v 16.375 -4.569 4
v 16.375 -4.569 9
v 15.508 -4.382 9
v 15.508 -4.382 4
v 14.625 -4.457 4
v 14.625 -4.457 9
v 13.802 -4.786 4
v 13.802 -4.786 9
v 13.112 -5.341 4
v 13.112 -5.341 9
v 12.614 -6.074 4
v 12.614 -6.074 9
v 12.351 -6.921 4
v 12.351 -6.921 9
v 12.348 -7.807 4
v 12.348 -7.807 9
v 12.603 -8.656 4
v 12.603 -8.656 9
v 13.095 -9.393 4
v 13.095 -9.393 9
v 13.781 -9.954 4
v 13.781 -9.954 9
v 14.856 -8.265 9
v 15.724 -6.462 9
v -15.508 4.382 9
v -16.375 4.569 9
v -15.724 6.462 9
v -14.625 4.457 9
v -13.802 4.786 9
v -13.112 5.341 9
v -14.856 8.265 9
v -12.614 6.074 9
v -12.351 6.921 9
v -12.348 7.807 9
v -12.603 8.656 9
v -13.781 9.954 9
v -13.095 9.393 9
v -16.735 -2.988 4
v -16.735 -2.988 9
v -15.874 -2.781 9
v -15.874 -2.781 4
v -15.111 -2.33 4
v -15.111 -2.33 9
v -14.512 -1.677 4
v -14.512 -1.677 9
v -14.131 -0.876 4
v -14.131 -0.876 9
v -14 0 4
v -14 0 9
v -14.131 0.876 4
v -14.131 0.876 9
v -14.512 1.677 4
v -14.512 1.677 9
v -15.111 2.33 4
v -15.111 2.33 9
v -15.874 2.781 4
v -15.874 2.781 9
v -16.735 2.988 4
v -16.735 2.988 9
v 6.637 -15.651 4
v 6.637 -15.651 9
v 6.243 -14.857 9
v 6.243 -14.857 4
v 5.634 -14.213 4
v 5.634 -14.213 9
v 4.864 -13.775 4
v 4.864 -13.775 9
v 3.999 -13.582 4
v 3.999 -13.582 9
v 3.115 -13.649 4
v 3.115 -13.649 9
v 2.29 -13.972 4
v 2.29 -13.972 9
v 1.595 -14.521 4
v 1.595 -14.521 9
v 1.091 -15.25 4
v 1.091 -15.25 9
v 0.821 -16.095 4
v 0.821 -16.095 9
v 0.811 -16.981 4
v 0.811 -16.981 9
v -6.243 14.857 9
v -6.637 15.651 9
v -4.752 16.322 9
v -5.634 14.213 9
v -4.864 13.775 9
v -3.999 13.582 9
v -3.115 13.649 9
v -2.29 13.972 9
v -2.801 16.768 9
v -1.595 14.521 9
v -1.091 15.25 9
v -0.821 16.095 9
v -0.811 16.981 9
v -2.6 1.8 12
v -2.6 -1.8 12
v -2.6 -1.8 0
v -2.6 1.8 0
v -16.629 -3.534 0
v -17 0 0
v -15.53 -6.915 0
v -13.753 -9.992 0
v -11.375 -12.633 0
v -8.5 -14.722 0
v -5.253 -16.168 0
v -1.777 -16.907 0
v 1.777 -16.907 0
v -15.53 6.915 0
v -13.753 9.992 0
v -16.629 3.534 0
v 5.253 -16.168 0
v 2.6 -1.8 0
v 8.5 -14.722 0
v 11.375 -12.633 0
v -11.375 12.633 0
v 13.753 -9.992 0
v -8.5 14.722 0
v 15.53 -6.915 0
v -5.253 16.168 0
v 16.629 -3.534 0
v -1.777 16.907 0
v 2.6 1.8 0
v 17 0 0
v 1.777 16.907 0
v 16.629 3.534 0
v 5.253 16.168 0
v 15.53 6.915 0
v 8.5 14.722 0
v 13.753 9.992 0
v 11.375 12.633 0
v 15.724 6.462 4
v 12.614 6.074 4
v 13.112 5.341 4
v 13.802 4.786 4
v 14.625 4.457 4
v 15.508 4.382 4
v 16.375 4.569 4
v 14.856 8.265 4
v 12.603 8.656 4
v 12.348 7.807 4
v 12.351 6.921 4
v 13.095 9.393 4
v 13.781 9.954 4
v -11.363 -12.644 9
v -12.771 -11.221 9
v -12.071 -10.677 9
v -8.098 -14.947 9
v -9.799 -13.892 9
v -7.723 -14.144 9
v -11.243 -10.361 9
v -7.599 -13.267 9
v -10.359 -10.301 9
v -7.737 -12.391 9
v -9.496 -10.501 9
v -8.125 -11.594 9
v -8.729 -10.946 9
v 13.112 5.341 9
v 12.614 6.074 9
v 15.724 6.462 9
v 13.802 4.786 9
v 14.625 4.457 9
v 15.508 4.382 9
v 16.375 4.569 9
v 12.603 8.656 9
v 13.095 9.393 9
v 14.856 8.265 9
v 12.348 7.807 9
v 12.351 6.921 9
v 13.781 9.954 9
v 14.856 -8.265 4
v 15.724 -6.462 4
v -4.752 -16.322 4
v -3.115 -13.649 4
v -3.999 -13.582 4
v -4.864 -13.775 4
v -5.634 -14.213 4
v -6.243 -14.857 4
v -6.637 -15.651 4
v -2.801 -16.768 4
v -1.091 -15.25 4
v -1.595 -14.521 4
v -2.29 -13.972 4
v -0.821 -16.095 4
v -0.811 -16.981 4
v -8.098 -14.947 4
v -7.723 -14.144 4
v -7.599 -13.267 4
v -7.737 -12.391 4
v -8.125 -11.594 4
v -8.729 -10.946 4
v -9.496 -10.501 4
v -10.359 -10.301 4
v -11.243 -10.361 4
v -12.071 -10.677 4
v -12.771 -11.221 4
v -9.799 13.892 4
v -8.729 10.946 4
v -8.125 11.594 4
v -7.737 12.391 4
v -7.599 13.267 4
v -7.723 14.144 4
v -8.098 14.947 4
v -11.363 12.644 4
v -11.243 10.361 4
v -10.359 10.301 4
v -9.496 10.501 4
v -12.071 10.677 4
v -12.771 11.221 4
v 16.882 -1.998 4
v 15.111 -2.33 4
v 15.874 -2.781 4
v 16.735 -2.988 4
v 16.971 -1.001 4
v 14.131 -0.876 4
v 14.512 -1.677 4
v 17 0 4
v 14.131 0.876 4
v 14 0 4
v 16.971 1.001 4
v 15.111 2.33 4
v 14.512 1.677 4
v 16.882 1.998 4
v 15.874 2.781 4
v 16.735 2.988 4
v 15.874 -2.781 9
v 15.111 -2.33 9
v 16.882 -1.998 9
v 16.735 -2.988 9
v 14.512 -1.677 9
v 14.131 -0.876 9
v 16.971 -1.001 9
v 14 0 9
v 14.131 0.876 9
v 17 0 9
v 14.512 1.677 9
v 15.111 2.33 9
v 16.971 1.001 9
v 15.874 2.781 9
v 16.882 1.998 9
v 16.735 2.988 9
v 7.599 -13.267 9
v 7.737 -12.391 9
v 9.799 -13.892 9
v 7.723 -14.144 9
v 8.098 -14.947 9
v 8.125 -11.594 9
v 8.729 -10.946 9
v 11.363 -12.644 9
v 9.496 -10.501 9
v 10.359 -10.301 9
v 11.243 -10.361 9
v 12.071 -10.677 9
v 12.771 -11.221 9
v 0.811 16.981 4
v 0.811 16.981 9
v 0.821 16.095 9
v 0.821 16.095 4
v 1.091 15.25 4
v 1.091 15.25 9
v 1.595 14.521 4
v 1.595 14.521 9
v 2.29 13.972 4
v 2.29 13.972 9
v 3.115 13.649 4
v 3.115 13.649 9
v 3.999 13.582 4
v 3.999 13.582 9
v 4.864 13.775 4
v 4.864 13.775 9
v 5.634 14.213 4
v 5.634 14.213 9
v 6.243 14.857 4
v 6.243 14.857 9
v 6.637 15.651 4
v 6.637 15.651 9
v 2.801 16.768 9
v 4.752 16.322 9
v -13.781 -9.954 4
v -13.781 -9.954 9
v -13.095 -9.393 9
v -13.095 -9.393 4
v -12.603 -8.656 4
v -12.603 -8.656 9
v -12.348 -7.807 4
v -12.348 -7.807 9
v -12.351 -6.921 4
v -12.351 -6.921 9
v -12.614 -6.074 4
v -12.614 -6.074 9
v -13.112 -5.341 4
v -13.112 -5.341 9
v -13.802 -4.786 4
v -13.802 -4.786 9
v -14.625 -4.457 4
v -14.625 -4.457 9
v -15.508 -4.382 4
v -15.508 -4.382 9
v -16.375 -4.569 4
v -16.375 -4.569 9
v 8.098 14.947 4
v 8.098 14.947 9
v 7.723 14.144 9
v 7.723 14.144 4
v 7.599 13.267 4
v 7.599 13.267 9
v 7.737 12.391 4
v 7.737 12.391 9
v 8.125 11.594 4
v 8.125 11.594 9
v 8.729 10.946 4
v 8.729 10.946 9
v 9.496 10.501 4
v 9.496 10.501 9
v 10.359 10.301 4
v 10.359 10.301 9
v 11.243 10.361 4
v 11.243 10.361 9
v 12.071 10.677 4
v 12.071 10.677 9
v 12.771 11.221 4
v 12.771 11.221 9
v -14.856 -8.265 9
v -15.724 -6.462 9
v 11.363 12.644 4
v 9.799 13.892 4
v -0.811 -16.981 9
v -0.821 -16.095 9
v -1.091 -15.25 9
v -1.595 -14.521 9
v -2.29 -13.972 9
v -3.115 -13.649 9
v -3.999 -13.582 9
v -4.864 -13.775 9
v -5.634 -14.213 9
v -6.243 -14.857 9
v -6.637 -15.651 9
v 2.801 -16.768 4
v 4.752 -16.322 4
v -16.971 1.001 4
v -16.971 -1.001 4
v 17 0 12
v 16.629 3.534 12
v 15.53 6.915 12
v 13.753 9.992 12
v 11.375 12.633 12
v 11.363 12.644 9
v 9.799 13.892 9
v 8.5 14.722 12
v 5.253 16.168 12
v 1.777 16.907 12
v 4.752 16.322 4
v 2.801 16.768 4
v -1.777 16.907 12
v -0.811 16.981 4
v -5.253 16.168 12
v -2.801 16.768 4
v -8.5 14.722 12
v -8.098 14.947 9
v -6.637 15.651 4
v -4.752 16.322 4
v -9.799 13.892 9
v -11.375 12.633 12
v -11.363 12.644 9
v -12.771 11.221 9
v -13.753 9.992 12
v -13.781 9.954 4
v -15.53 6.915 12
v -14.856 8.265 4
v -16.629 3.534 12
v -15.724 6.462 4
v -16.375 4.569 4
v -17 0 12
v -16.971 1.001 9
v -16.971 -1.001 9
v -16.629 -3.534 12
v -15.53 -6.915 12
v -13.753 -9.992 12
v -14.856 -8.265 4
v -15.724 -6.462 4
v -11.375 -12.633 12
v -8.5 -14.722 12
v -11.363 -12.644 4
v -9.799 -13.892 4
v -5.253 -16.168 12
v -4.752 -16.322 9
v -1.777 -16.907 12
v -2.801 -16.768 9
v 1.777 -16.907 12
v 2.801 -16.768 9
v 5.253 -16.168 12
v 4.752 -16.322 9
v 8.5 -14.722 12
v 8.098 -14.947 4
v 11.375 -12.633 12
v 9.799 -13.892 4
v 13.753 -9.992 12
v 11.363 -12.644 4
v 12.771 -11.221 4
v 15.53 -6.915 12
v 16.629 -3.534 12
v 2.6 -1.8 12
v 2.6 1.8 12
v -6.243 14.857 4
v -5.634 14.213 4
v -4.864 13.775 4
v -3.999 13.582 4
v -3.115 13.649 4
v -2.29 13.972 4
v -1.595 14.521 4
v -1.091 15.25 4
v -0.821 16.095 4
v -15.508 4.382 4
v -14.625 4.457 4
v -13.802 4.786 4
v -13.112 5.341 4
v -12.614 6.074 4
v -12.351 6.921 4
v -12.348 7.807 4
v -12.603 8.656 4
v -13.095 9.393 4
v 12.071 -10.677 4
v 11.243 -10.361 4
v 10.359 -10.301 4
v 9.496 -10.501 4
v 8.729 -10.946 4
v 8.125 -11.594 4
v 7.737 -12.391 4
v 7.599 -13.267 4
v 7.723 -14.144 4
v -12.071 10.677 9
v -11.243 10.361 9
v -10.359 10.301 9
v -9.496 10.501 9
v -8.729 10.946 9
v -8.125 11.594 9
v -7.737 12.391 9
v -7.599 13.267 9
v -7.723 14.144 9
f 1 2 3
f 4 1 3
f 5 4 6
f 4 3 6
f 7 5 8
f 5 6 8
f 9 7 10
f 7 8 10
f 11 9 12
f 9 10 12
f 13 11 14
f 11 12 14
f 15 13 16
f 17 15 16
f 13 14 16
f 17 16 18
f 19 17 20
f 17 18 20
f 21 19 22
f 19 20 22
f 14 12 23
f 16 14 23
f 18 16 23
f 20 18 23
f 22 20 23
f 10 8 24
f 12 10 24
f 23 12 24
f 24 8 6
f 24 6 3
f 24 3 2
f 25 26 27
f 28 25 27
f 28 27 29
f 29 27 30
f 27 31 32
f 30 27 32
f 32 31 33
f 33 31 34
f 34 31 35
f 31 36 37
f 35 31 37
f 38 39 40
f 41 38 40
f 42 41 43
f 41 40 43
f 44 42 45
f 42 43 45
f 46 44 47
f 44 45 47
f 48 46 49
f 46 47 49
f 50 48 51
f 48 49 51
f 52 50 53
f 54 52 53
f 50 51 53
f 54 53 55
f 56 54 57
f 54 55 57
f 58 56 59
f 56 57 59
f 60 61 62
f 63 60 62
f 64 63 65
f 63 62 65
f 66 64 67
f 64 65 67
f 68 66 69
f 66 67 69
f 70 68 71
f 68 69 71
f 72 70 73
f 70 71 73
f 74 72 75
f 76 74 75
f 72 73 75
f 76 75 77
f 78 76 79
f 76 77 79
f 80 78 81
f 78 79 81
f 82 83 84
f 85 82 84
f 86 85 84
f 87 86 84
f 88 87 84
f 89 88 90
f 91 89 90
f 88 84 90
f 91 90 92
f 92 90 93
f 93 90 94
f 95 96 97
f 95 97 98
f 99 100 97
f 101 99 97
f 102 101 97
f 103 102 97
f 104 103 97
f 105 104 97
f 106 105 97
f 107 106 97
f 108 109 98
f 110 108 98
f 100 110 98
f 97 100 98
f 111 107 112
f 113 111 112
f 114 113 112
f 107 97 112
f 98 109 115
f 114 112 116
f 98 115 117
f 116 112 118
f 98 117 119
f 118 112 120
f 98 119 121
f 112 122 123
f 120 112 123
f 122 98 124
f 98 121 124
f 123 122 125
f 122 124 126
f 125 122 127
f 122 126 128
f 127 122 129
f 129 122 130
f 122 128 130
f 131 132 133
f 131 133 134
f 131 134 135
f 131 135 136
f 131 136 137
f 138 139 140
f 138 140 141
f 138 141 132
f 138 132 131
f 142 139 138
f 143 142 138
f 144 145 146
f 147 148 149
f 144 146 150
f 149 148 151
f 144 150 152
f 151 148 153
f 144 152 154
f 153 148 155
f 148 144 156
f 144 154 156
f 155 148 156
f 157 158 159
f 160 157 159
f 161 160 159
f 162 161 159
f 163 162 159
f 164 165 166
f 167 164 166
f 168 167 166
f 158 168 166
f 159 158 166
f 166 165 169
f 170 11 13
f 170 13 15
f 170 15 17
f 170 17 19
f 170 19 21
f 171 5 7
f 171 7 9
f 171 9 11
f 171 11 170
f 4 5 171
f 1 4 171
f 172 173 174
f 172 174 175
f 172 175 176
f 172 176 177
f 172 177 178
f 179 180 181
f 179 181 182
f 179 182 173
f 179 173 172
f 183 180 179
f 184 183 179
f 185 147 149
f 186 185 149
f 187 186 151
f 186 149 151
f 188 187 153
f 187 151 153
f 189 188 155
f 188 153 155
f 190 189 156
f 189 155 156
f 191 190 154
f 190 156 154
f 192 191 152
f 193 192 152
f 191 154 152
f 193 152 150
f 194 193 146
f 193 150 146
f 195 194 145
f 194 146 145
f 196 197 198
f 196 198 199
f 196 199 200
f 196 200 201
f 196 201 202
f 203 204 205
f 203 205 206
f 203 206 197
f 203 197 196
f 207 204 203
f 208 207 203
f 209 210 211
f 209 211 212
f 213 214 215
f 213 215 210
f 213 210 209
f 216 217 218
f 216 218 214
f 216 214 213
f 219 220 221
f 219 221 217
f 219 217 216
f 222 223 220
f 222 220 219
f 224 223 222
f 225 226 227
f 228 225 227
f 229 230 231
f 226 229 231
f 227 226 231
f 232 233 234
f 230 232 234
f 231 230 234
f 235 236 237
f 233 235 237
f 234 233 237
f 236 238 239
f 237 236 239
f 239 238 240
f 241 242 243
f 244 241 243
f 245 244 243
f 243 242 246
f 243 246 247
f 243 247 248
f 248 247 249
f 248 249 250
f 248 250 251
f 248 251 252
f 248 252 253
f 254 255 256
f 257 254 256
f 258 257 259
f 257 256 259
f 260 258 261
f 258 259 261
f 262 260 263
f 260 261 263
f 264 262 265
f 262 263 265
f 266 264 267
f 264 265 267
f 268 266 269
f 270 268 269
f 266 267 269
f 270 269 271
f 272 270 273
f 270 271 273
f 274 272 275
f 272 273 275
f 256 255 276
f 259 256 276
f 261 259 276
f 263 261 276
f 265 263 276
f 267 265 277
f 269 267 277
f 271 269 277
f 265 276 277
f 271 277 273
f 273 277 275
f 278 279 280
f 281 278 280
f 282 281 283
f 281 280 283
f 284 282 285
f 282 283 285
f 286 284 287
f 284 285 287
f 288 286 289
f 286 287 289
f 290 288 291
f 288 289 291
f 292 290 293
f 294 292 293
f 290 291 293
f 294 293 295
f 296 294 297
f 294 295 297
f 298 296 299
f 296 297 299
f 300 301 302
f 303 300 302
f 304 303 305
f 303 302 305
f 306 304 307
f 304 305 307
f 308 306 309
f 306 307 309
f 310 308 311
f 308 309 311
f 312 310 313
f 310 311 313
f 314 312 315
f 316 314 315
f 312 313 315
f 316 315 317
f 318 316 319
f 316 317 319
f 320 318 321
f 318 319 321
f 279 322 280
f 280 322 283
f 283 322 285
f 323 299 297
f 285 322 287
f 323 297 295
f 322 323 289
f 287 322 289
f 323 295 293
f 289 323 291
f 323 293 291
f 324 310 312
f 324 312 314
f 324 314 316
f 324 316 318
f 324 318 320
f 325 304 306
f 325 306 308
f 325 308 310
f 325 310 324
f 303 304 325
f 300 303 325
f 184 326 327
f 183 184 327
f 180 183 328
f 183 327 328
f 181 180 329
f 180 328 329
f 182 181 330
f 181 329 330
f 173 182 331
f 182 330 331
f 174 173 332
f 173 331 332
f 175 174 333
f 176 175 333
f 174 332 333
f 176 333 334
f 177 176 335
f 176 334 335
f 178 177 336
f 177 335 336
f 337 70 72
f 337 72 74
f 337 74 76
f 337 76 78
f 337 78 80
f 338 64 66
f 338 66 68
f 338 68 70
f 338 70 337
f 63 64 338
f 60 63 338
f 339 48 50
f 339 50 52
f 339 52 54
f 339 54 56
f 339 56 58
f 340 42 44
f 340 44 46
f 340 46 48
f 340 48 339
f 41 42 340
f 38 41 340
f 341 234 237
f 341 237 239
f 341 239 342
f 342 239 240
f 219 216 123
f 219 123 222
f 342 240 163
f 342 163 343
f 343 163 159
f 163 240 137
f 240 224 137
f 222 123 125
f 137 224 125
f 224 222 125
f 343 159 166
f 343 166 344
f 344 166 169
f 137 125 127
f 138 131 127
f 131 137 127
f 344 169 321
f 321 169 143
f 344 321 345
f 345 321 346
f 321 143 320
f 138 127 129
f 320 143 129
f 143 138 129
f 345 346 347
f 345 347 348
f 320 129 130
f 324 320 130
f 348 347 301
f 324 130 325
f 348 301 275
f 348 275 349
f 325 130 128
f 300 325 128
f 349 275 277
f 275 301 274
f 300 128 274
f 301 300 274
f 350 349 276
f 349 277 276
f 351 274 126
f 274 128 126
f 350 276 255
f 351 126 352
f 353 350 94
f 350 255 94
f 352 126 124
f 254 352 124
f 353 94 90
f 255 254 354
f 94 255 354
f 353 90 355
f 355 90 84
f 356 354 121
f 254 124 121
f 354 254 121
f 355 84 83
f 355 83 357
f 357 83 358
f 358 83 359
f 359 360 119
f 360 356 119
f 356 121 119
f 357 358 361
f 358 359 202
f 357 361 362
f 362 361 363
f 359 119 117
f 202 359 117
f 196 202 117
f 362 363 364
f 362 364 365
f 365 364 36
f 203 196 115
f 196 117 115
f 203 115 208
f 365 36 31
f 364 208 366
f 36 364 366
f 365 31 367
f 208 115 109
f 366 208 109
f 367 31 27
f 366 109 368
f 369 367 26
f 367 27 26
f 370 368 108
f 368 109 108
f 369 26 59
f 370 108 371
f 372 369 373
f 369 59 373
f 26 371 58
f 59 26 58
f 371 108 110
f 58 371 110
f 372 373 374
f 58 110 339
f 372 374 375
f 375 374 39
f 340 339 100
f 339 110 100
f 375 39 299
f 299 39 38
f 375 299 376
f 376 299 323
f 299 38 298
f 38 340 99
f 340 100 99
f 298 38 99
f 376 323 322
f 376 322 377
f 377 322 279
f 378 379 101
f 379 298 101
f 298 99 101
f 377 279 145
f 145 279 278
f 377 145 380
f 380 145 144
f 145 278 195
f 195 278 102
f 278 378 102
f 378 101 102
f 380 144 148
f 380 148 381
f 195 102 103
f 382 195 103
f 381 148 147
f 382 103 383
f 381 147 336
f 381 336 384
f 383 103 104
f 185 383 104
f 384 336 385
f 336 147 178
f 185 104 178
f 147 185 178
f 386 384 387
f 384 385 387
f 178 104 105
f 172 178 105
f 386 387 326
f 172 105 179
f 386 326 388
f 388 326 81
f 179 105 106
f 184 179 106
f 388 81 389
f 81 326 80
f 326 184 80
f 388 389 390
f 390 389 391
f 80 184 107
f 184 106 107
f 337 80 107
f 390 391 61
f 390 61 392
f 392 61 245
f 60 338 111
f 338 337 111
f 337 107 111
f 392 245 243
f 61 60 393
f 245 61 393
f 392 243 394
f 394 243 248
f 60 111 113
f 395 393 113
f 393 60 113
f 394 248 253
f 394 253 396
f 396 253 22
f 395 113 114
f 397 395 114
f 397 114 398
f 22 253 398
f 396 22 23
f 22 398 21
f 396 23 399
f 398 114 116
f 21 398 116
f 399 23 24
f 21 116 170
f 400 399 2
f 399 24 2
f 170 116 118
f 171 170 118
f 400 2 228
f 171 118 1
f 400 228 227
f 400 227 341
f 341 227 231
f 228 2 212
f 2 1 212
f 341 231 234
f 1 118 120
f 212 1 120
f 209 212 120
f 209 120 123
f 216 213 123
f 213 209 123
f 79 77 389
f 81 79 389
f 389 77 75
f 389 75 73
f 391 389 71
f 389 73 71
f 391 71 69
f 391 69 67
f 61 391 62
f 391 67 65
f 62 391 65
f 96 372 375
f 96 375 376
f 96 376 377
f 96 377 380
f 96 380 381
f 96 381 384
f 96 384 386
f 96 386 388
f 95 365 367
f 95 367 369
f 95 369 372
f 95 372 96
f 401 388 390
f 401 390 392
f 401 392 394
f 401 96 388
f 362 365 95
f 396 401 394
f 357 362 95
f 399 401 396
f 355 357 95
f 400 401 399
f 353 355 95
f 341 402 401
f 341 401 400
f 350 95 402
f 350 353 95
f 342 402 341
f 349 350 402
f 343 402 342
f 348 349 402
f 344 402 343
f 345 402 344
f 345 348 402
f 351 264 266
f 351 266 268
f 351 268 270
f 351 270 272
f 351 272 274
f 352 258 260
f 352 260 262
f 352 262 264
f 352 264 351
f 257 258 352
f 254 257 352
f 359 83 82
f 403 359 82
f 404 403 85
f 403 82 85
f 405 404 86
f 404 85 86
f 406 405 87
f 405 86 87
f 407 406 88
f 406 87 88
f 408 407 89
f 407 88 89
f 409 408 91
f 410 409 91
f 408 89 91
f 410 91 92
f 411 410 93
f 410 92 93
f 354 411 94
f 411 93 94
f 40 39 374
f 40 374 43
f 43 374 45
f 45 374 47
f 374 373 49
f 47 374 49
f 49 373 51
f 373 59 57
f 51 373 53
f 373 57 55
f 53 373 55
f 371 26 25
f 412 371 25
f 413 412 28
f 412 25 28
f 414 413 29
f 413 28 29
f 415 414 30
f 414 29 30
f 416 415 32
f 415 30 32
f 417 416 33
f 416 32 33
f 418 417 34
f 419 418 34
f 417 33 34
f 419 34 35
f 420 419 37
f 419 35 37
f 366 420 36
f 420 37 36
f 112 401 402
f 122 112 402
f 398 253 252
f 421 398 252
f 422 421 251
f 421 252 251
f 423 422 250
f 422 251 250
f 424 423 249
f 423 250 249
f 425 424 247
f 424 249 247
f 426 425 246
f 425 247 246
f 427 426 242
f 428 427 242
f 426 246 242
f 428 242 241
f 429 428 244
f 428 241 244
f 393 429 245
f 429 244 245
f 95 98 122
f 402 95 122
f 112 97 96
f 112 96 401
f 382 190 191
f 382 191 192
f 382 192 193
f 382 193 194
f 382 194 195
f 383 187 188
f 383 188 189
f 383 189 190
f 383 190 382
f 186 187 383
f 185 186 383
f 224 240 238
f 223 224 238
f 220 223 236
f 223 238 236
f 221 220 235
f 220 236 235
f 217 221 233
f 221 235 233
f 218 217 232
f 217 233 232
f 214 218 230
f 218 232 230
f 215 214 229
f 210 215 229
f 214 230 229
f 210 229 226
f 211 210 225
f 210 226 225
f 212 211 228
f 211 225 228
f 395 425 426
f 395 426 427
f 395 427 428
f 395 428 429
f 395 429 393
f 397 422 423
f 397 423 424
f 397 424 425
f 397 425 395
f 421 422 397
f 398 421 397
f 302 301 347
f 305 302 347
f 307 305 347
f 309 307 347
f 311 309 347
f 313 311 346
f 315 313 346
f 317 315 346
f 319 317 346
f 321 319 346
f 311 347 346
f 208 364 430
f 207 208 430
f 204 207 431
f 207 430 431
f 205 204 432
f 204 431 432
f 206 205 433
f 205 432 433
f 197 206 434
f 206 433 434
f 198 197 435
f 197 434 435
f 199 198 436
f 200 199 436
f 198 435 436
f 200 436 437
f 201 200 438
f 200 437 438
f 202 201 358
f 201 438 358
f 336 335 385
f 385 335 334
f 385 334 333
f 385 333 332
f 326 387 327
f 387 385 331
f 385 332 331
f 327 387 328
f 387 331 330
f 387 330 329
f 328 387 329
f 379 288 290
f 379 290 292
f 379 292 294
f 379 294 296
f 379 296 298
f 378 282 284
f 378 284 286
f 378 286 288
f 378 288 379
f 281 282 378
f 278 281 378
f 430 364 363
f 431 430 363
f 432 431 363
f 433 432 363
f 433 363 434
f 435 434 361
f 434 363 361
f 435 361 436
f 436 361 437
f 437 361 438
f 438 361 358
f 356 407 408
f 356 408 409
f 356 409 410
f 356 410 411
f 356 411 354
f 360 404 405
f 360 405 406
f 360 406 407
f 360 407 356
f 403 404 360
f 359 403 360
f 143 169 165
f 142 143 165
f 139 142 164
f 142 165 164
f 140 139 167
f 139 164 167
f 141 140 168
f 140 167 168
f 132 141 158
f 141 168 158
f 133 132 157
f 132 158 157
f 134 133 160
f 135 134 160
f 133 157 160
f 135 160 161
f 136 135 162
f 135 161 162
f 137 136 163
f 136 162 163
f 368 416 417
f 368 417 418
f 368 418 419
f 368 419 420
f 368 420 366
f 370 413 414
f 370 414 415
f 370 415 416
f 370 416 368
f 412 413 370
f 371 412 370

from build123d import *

# Parameters (mm, degrees)
F0_R      = 17
F1_DEPTH  = 4
F2_R      = 17
F3_DEPTH  = 5
F5_DEPTH  = 5
F6_COUNT  = 14
F7_R      = 17
F8_DEPTH  = 3
F9_W      = 5.2
F9_H      = 3.6
F10_DEPTH = 300


with BuildPart() as f1:
    # F0 (on Top) → F1 (new body)
    with BuildSketch(Plane.XY):
        Circle(F0_R)
    extrude(amount=F1_DEPTH)

    # F2 (on face) → F3 (join)
    with BuildSketch(Plane.XY.offset(4)):
        Circle(F2_R)
    extrude(amount=F3_DEPTH)

    # F6: F5 ×14 about axis
    f6_axis = Axis((0, 0, 9), (0, 0, 1))


with BuildPart() as f5:
    # F4 (on face) → F5 (new body)
    with BuildSketch(Plane.XY.offset(9)):
        with BuildLine():
            Line((19.066369161, -2.1748835579), (19.066369161, 2.1748835579))
            ThreePointArc((19.066369161, 2.1748835579), (18.1125082755, 2.7860949978), (17, 3))
            ThreePointArc((17, 3), (16.8675178144, 2.9970733175), (16.7352941176, 2.9882989803))
            ThreePointArc((16.7352941176, 2.9882989803), (16.9336942219, 1.5), (17, 0))
            ThreePointArc((17, 0), (16.9336942219, -1.5), (16.7352941176, -2.9882989803))
            ThreePointArc((16.7352941176, -2.9882989803), (16.8675178144, -2.9970733175), (17, -3))
            ThreePointArc((17, -3), (18.1125082755, -2.7860949978), (19.066369161, -2.1748835579))
        make_face()
        with BuildLine():
            ThreePointArc((17, 3), (18.1125082755, 2.7860949978), (19.066369161, 2.1748835579))
            Line((19.066369161, 2.1748835579), (19.066369161, 3))
            Line((19.066369161, 3), (17, 3))
        make_face()
        with BuildLine():
            ThreePointArc((17, 0), (16.9336942219, 1.5), (16.7352941176, 2.9882989803))
            ThreePointArc((16.7352941176, 2.9882989803), (14, 0), (16.7352941176, -2.9882989803))
            ThreePointArc((16.7352941176, -2.9882989803), (16.9336942219, -1.5), (17, 0))
        make_face()
    extrude(amount=-F5_DEPTH)


with BuildPart() as f1_1:
    add(f1.part)
    for i in range(1, F6_COUNT):
        add(f5.part.rotate(f6_axis, i * 360 / F6_COUNT), mode=Mode.SUBTRACT)

    # F6#seed: cut F5
    add(f5.part, mode=Mode.SUBTRACT)

    # F7 (on face) → F8 (join)
    with BuildSketch(Plane.XY.offset(9)):
        Circle(F7_R)
    extrude(amount=F8_DEPTH)

    # F9 (on face) → F10 (cut)
    with BuildSketch(Plane.XY.offset(12)):
        Rectangle(F9_W, F9_H)
    extrude(amount=-F10_DEPTH, mode=Mode.SUBTRACT)


solid = f1_1.part
